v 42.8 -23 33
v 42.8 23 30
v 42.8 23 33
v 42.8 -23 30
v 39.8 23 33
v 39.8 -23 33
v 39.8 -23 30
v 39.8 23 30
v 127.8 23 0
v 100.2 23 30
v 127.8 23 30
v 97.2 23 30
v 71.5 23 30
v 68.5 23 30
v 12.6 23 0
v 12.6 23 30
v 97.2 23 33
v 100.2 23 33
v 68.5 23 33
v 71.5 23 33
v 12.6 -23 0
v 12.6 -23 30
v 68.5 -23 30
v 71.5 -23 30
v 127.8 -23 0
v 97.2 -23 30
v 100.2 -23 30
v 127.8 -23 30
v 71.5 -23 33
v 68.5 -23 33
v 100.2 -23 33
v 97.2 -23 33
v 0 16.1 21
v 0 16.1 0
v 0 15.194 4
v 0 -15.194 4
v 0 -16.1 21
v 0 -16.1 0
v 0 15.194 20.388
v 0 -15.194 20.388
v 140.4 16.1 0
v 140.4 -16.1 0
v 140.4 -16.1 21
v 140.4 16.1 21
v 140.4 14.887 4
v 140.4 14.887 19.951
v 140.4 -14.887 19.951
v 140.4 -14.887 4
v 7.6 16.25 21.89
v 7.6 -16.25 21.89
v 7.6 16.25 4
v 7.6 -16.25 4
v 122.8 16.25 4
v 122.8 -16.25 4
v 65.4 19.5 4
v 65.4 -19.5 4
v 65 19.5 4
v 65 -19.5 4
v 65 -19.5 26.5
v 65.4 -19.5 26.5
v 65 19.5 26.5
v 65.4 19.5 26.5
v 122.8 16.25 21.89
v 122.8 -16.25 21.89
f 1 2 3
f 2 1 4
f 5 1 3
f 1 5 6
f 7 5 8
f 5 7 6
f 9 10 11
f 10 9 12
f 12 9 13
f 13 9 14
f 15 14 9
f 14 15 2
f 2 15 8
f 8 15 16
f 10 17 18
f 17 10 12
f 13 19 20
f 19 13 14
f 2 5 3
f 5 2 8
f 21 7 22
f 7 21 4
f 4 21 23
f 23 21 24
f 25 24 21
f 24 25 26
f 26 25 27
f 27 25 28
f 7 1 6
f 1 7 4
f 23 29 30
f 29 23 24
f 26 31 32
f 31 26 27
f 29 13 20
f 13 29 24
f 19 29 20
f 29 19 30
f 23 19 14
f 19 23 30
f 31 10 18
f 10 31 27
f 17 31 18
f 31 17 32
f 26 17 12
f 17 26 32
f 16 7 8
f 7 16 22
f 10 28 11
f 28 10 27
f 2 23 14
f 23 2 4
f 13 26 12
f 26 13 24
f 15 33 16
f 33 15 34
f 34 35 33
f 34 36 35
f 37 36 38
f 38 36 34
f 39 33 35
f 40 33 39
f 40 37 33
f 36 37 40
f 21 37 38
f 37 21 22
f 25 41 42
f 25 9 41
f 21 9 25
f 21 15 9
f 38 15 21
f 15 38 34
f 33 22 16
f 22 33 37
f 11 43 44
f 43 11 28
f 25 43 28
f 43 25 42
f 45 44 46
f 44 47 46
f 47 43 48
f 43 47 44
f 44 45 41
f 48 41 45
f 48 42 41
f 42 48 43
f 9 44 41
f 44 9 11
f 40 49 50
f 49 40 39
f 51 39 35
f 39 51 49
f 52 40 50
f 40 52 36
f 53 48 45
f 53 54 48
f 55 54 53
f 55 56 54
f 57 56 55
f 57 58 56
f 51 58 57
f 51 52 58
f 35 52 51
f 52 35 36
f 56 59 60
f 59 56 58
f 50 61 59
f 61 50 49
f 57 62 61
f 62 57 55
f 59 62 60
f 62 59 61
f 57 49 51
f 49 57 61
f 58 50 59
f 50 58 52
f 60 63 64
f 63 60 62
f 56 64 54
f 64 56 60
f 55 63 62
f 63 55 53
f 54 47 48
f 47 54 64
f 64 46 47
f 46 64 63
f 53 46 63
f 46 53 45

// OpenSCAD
$fn = 32;

// ----------------------------------------------------------------------
// Faired channel: 140 x 46 x 30 mm, 3.5 mm walls, faired ends
// ----------------------------------------------------------------------

// --- parameters (mm) ---
length = 140;             // channel length
width = 46;               // channel width at mid length
height = 30;              // channel height at mid length
wall = 3.5;               // side wall thickness
floor_t = 4;              // floor thickness
end_w = 32.2;             // faired end width
end_h = 21;               // faired end height
ribs = 3;                 // stiffening ribs on the top
rib_t = 3;                // rib thickness
rib_h = 3;                // rib height

difference() {
  union() {
    hull() {
      translate([0, -16.1, 0]) cube([0.4, 32.2, 21]);
      translate([12.6, -23, 0]) cube([0.4, 46, 30]);
    }
    hull() {
      translate([12.6, -23, 0]) cube([0.4, 46, 30]);
      translate([70, -23, 0]) cube([0.4, 46, 30]);
    }
    hull() {
      translate([70, -23, 0]) cube([0.4, 46, 30]);
      translate([127.4, -23, 0]) cube([0.4, 46, 30]);
    }
    hull() {
      translate([127.4, -23, 0]) cube([0.4, 46, 30]);
      translate([140, -16.1, 0]) cube([0.4, 32.2, 21]);
    }
    /* stiffening ribs across the flat top, sunk 0.8 mm into it */
    for (i = [1 : ribs]) {
      translate([12.6 + i * (length - 2 * 12.6) / (ribs + 1) - rib_t / 2, -width / 2, height - 0.8]) cube([rib_t, width, rib_h + 0.8]);
    }
  }
  /* cavity, 5 mm proud of both ends so the ports are cut clean */
  hull() {
    translate([-5, -14.5, 4]) cube([0.4, 29, 15.4]);
    translate([7.6, -16.25, 4]) cube([0.4, 32.5, 17.89]);
  }
  hull() {
    translate([7.6, -16.25, 4]) cube([0.4, 32.5, 17.89]);
    translate([65, -19.5, 4]) cube([0.4, 39, 22.5]);
  }
  hull() {
    translate([65, -19.5, 4]) cube([0.4, 39, 22.5]);
    translate([122.4, -16.25, 4]) cube([0.4, 32.5, 17.89]);
  }
  hull() {
    translate([122.4, -16.25, 4]) cube([0.4, 32.5, 17.89]);
    translate([145, -14.5, 4]) cube([0.4, 29, 15.4]);
  }
}
